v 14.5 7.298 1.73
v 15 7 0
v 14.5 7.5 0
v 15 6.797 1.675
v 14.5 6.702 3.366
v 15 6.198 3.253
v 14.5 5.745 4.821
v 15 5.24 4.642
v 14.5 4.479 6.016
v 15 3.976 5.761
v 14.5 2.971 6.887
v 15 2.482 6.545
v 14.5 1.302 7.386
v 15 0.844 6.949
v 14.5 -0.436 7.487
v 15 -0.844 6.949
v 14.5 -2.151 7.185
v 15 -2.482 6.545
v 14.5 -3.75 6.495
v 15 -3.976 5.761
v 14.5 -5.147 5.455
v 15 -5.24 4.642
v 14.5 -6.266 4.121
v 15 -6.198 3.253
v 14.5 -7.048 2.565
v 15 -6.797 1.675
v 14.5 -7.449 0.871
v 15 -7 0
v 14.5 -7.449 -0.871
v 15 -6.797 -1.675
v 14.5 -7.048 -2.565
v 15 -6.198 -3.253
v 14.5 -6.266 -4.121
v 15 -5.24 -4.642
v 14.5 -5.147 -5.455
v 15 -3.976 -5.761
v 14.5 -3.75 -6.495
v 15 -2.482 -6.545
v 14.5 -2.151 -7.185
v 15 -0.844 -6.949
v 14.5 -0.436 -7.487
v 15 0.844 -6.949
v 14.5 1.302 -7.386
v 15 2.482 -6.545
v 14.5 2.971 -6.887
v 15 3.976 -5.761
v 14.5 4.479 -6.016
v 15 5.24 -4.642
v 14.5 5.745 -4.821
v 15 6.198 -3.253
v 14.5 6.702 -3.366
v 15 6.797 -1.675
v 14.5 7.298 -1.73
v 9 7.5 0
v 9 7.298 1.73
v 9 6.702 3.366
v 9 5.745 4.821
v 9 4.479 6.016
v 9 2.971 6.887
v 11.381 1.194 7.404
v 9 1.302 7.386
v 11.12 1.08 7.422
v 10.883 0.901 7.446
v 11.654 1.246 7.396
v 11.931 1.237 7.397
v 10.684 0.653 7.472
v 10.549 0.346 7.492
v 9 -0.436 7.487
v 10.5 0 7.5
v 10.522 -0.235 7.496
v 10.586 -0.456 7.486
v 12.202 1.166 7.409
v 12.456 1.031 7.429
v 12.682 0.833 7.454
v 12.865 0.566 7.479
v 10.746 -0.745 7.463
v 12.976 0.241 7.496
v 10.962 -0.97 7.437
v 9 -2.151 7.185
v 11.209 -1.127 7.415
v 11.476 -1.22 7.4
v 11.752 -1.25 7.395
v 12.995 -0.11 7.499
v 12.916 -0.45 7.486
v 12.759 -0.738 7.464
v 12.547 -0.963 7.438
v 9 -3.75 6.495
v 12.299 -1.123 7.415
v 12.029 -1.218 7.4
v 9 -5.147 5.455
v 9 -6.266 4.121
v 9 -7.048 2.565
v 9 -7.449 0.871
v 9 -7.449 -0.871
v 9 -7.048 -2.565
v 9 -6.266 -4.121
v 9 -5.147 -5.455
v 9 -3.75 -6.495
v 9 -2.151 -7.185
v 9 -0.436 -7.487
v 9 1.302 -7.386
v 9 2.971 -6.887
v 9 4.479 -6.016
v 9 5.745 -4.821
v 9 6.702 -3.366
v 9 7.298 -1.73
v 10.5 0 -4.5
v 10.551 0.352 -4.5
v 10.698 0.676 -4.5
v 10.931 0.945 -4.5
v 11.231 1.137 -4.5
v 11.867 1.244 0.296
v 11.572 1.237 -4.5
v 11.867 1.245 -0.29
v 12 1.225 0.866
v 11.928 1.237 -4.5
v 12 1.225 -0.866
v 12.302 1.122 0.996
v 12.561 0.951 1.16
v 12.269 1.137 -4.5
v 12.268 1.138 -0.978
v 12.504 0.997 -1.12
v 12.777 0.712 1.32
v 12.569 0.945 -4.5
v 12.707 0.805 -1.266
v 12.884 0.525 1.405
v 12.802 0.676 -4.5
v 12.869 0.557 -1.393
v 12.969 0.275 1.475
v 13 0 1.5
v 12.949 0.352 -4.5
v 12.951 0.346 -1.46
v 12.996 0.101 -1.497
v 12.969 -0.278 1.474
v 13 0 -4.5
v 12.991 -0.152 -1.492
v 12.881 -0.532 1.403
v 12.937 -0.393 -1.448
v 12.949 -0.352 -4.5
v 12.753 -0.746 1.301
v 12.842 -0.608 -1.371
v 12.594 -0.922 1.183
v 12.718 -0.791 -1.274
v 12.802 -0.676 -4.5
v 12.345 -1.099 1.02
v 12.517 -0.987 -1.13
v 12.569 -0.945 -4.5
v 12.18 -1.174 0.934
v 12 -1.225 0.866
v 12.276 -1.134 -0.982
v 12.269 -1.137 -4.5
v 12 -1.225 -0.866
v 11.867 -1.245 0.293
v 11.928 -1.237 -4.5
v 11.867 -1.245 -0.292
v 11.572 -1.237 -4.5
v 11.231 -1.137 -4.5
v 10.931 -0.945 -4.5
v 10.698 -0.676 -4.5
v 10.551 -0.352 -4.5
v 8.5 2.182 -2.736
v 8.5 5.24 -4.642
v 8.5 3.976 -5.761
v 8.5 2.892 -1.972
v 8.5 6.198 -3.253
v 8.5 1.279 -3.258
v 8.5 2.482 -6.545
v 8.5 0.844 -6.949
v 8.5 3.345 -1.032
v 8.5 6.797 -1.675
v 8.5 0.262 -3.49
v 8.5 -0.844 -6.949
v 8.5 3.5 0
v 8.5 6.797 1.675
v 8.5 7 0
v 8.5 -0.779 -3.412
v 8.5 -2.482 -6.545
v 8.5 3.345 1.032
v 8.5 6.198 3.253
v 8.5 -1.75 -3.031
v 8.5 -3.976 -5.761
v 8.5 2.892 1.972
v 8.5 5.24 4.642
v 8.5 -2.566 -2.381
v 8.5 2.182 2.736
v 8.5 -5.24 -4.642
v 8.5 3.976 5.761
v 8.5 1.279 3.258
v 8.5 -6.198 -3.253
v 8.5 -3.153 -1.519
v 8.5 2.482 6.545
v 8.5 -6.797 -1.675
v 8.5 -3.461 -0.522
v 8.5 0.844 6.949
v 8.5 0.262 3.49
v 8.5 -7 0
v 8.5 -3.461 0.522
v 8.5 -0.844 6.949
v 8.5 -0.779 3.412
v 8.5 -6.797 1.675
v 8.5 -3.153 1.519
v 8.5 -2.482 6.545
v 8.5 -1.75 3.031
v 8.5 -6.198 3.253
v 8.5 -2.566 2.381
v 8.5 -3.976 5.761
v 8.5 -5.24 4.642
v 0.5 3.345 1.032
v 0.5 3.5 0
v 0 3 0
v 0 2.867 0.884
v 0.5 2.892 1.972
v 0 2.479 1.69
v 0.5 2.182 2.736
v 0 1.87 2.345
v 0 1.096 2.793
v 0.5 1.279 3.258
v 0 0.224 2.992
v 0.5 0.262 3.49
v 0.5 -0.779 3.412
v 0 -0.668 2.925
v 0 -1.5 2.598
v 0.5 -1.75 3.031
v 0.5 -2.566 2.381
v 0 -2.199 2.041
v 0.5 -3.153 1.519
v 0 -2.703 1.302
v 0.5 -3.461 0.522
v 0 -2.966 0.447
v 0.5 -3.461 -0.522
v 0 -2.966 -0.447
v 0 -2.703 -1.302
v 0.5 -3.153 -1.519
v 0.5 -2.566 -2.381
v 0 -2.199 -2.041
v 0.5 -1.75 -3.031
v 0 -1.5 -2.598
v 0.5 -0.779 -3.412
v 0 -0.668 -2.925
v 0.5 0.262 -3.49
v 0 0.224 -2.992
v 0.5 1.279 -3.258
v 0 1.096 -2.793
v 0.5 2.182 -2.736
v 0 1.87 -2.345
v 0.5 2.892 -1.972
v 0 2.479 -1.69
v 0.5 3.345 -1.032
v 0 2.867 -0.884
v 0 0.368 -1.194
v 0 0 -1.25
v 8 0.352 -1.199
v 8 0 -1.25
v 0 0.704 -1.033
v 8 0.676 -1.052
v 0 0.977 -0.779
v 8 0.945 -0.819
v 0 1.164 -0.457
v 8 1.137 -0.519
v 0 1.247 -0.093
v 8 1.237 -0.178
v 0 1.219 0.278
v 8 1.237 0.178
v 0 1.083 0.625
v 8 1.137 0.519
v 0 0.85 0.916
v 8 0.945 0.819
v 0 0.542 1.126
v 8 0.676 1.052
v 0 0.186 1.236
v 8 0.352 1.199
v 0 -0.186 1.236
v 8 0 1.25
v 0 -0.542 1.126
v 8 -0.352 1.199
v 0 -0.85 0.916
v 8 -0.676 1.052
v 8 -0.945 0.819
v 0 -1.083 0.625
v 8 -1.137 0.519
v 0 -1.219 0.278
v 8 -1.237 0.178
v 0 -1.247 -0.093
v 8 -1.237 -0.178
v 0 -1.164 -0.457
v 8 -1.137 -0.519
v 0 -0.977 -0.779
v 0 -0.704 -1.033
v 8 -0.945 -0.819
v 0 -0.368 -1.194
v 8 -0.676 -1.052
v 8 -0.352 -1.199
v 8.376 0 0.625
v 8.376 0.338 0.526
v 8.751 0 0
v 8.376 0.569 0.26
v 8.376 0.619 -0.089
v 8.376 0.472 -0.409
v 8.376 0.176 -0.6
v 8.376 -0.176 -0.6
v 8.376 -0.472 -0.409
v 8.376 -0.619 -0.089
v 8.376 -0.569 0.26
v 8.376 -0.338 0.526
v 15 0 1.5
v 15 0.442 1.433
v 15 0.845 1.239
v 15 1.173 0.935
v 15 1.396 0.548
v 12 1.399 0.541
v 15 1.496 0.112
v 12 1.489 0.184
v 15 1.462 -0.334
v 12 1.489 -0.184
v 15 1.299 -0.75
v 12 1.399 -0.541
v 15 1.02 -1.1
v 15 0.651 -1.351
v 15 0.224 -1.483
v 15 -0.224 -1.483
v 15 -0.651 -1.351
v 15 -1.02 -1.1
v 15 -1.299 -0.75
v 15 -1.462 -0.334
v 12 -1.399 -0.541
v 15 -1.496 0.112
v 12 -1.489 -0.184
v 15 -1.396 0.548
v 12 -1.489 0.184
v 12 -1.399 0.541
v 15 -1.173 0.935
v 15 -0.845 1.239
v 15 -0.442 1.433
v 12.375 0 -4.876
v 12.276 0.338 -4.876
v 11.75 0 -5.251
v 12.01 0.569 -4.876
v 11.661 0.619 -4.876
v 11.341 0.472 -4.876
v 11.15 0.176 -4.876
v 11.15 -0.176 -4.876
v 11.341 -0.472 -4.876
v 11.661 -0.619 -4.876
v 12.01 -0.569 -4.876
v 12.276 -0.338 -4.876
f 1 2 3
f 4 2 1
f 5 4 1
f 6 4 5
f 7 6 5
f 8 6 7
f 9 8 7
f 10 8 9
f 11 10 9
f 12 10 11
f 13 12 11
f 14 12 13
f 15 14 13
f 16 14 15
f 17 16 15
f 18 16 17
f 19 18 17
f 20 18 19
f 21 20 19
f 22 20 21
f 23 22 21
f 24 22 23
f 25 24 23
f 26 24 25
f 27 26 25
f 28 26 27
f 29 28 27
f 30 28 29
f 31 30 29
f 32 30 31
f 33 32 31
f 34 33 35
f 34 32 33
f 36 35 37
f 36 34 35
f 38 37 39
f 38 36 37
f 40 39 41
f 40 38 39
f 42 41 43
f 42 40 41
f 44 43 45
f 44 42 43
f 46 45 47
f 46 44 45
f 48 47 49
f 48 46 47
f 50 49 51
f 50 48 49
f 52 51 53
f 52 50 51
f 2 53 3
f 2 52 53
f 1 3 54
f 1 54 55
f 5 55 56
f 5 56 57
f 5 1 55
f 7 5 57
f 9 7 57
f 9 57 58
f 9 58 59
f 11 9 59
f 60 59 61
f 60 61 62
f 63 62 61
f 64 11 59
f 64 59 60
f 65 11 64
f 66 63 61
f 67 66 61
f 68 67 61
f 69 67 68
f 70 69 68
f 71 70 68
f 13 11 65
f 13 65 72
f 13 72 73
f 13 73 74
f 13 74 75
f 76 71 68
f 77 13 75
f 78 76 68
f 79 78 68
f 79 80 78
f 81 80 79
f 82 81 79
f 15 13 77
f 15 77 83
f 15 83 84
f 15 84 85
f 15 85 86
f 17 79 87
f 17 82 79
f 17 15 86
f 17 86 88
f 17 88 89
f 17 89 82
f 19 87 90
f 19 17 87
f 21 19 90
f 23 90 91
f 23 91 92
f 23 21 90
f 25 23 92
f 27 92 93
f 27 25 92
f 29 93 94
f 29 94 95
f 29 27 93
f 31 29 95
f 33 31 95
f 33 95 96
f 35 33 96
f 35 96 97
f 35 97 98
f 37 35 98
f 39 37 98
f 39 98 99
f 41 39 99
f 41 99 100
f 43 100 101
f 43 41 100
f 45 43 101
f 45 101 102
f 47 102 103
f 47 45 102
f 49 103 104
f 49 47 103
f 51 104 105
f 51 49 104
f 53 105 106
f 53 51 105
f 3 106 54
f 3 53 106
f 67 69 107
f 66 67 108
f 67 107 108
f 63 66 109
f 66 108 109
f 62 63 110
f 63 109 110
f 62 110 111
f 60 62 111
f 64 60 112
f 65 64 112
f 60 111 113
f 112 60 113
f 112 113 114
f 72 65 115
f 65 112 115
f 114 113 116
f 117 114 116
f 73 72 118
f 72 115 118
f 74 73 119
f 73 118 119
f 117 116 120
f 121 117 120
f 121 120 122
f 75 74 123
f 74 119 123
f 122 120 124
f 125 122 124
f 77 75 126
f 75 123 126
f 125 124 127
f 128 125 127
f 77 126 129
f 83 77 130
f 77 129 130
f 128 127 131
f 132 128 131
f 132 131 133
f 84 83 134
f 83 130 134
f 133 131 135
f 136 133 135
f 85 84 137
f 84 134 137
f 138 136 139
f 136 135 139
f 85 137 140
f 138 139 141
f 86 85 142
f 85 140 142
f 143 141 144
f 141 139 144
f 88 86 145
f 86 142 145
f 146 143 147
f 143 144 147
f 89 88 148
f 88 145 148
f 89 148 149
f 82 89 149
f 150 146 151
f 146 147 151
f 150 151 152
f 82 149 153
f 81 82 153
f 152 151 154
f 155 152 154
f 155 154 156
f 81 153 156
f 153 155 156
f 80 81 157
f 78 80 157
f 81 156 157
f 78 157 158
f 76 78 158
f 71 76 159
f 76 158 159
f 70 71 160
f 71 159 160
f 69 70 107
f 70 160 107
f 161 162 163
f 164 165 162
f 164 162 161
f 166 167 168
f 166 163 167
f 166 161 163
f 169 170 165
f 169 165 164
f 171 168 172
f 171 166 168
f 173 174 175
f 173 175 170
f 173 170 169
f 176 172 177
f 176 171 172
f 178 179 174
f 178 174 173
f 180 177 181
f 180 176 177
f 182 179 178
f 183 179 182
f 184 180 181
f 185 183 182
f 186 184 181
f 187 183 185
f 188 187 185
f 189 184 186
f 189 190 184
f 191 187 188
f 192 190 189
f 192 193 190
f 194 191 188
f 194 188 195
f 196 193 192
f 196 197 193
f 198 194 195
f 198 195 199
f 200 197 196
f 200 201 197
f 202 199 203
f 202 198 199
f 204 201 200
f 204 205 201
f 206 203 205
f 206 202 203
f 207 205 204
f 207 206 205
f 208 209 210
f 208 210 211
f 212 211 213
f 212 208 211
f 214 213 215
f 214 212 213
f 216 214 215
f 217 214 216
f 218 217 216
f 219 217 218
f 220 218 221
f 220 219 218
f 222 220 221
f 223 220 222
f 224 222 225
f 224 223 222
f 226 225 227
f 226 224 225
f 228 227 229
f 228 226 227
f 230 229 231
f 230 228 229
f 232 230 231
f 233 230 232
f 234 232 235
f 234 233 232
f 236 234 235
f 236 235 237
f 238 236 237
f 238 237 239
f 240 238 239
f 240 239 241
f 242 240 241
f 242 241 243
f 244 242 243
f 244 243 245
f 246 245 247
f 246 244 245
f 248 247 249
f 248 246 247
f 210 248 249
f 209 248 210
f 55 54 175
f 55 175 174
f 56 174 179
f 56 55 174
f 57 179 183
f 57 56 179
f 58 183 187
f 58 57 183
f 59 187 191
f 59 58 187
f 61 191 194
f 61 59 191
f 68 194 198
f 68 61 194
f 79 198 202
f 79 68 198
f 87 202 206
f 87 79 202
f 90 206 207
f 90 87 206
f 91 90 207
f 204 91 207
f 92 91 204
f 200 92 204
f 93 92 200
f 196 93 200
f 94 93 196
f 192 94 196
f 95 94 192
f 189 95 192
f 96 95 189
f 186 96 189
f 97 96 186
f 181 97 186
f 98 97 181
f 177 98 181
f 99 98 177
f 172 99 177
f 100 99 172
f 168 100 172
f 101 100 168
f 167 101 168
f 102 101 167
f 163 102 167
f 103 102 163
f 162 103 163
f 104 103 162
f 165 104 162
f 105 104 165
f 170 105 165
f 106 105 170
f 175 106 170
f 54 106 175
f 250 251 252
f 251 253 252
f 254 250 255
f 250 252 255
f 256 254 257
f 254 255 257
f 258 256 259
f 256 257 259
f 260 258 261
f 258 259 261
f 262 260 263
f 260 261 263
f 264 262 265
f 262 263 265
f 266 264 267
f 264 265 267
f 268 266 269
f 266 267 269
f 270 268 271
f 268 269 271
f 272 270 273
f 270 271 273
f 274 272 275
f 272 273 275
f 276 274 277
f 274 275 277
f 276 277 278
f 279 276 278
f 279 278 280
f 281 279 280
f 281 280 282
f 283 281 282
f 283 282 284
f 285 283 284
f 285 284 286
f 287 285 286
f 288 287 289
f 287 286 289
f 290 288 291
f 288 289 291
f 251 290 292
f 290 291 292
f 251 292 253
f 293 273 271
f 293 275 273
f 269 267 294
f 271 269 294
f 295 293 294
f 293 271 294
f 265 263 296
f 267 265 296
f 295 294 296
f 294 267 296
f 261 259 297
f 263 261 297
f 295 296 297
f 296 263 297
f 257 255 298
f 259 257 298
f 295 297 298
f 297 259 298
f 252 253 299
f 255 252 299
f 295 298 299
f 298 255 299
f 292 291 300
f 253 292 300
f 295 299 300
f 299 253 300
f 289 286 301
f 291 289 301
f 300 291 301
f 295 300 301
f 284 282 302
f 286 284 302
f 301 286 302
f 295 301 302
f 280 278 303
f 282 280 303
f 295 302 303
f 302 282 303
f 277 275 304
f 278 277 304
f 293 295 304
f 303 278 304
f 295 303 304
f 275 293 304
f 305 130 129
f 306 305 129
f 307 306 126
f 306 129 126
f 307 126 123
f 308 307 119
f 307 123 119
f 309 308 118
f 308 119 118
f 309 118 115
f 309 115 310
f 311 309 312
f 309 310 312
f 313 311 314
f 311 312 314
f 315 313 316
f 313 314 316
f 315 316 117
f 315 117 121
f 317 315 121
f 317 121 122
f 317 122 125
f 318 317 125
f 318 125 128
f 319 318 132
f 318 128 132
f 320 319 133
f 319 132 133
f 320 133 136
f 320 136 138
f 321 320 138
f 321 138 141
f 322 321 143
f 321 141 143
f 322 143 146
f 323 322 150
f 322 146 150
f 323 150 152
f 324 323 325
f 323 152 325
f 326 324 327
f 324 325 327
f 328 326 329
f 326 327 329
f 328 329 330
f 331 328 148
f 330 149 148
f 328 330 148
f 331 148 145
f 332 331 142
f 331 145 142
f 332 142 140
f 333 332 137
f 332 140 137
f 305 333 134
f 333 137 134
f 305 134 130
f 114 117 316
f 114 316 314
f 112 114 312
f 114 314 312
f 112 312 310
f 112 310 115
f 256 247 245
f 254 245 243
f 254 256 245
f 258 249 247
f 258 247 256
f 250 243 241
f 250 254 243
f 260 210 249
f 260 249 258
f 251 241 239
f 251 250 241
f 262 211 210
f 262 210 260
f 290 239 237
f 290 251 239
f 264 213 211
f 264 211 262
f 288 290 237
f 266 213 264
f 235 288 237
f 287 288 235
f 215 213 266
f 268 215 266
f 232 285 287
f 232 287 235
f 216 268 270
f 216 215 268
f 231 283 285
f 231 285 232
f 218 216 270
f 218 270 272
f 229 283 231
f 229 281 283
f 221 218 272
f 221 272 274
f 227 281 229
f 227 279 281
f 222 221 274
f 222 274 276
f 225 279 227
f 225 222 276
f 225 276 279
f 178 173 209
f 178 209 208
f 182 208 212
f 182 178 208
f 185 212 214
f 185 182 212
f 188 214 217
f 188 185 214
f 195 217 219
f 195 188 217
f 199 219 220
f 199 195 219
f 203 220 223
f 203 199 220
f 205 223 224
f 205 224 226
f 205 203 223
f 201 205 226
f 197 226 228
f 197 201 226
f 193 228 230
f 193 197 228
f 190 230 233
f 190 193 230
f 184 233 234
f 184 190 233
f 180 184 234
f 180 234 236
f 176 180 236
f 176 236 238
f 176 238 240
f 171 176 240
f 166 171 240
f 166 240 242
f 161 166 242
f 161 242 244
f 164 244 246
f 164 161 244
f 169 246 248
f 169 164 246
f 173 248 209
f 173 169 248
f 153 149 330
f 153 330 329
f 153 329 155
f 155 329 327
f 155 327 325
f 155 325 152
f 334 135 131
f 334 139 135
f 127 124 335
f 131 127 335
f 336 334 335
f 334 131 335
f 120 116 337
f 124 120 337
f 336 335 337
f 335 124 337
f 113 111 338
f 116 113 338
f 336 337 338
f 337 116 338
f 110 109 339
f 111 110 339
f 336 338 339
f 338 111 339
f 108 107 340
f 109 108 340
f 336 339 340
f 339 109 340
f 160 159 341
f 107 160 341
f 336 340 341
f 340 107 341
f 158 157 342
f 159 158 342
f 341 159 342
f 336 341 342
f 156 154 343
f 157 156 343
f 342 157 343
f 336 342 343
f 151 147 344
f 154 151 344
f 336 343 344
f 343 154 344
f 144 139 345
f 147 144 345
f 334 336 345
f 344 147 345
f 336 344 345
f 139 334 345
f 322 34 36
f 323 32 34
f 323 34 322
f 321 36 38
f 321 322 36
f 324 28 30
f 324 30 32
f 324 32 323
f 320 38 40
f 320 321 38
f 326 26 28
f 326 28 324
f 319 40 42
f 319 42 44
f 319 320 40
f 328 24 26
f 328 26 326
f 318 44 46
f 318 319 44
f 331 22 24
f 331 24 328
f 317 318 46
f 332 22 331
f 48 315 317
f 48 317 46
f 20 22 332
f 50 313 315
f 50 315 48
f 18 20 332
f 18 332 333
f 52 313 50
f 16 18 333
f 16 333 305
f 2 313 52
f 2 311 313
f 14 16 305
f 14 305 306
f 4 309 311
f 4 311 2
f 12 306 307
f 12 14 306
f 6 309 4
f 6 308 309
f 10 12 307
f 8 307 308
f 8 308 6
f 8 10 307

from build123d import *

# Parameters (mm, degrees)
M3_TAPPED_HOLE1_D            = 2.5
M3_TAPPED_HOLE1_DEPTH        = 8
M3_TAPPED_HOLE1_TIP          = 0.751075774
F_3_0_3_DIAMETER_HOLE1_D     = 3
F_3_0_3_DIAMETER_HOLE1_DEPTH = 3
F_3_0_3_DIAMETER_HOLE1_TIP   = 0.901290929
M3_TAPPED_HOLE2_D            = 2.5
M3_TAPPED_HOLE2_DEPTH        = 12
M3_TAPPED_HOLE2_TIP          = 0.751075774
CHAMFER1_SIZE                = 0.5


with BuildPart() as part:
    # Sketch1 → Revolve1 (revolve)
    with BuildSketch(Plane.XY):
        Polygon((0, 0), (0, 3.5), (8.5, 3.5), (8.5, 7.5), (15, 7.5), (15, 0), align=None)
    revolve(axis=Axis((0, 0, 0), (1, 0, 0)))

    # M3 Tapped Hole1
    with Locations(Plane.ZY):
        with Locations((0, 0)):
            Hole(M3_TAPPED_HOLE1_D / 2, depth=M3_TAPPED_HOLE1_DEPTH)
            with Locations((0, 0, -(M3_TAPPED_HOLE1_DEPTH + M3_TAPPED_HOLE1_TIP / 2))):  # 118° drill point
                Cone(0, M3_TAPPED_HOLE1_D / 2, M3_TAPPED_HOLE1_TIP, mode=Mode.SUBTRACT)

    # Ø3.0 (3) Diameter Hole1
    with Locations(Plane(origin=(15, 0, 0), x_dir=(0, 0, -1), z_dir=(1, 0, 0))):
        with Locations((0, 0)):
            Hole(F_3_0_3_DIAMETER_HOLE1_D / 2, depth=F_3_0_3_DIAMETER_HOLE1_DEPTH)
            with Locations((0, 0, -(F_3_0_3_DIAMETER_HOLE1_DEPTH + F_3_0_3_DIAMETER_HOLE1_TIP / 2))):  # 118° drill point
                Cone(0, F_3_0_3_DIAMETER_HOLE1_D / 2, F_3_0_3_DIAMETER_HOLE1_TIP, mode=Mode.SUBTRACT)

    # M3 Tapped Hole2
    with Locations(Plane.XY.offset(7.5)):
        with Locations((11.75, 0)):
            Hole(M3_TAPPED_HOLE2_D / 2, depth=M3_TAPPED_HOLE2_DEPTH)
            with Locations((0, 0, -(M3_TAPPED_HOLE2_DEPTH + M3_TAPPED_HOLE2_TIP / 2))):  # 118° drill point
                Cone(0, M3_TAPPED_HOLE2_D / 2, M3_TAPPED_HOLE2_TIP, mode=Mode.SUBTRACT)

    # Chamfer1
    chamfer1_edges = [part.edges().sort_by_distance(p)[0] for p in [
        (15, -7.5, 0),
        (8.5, -7.5, 0),
        (0, -3.5, 0),
    ]]
    chamfer(chamfer1_edges, length=CHAMFER1_SIZE)


solid = part.part
